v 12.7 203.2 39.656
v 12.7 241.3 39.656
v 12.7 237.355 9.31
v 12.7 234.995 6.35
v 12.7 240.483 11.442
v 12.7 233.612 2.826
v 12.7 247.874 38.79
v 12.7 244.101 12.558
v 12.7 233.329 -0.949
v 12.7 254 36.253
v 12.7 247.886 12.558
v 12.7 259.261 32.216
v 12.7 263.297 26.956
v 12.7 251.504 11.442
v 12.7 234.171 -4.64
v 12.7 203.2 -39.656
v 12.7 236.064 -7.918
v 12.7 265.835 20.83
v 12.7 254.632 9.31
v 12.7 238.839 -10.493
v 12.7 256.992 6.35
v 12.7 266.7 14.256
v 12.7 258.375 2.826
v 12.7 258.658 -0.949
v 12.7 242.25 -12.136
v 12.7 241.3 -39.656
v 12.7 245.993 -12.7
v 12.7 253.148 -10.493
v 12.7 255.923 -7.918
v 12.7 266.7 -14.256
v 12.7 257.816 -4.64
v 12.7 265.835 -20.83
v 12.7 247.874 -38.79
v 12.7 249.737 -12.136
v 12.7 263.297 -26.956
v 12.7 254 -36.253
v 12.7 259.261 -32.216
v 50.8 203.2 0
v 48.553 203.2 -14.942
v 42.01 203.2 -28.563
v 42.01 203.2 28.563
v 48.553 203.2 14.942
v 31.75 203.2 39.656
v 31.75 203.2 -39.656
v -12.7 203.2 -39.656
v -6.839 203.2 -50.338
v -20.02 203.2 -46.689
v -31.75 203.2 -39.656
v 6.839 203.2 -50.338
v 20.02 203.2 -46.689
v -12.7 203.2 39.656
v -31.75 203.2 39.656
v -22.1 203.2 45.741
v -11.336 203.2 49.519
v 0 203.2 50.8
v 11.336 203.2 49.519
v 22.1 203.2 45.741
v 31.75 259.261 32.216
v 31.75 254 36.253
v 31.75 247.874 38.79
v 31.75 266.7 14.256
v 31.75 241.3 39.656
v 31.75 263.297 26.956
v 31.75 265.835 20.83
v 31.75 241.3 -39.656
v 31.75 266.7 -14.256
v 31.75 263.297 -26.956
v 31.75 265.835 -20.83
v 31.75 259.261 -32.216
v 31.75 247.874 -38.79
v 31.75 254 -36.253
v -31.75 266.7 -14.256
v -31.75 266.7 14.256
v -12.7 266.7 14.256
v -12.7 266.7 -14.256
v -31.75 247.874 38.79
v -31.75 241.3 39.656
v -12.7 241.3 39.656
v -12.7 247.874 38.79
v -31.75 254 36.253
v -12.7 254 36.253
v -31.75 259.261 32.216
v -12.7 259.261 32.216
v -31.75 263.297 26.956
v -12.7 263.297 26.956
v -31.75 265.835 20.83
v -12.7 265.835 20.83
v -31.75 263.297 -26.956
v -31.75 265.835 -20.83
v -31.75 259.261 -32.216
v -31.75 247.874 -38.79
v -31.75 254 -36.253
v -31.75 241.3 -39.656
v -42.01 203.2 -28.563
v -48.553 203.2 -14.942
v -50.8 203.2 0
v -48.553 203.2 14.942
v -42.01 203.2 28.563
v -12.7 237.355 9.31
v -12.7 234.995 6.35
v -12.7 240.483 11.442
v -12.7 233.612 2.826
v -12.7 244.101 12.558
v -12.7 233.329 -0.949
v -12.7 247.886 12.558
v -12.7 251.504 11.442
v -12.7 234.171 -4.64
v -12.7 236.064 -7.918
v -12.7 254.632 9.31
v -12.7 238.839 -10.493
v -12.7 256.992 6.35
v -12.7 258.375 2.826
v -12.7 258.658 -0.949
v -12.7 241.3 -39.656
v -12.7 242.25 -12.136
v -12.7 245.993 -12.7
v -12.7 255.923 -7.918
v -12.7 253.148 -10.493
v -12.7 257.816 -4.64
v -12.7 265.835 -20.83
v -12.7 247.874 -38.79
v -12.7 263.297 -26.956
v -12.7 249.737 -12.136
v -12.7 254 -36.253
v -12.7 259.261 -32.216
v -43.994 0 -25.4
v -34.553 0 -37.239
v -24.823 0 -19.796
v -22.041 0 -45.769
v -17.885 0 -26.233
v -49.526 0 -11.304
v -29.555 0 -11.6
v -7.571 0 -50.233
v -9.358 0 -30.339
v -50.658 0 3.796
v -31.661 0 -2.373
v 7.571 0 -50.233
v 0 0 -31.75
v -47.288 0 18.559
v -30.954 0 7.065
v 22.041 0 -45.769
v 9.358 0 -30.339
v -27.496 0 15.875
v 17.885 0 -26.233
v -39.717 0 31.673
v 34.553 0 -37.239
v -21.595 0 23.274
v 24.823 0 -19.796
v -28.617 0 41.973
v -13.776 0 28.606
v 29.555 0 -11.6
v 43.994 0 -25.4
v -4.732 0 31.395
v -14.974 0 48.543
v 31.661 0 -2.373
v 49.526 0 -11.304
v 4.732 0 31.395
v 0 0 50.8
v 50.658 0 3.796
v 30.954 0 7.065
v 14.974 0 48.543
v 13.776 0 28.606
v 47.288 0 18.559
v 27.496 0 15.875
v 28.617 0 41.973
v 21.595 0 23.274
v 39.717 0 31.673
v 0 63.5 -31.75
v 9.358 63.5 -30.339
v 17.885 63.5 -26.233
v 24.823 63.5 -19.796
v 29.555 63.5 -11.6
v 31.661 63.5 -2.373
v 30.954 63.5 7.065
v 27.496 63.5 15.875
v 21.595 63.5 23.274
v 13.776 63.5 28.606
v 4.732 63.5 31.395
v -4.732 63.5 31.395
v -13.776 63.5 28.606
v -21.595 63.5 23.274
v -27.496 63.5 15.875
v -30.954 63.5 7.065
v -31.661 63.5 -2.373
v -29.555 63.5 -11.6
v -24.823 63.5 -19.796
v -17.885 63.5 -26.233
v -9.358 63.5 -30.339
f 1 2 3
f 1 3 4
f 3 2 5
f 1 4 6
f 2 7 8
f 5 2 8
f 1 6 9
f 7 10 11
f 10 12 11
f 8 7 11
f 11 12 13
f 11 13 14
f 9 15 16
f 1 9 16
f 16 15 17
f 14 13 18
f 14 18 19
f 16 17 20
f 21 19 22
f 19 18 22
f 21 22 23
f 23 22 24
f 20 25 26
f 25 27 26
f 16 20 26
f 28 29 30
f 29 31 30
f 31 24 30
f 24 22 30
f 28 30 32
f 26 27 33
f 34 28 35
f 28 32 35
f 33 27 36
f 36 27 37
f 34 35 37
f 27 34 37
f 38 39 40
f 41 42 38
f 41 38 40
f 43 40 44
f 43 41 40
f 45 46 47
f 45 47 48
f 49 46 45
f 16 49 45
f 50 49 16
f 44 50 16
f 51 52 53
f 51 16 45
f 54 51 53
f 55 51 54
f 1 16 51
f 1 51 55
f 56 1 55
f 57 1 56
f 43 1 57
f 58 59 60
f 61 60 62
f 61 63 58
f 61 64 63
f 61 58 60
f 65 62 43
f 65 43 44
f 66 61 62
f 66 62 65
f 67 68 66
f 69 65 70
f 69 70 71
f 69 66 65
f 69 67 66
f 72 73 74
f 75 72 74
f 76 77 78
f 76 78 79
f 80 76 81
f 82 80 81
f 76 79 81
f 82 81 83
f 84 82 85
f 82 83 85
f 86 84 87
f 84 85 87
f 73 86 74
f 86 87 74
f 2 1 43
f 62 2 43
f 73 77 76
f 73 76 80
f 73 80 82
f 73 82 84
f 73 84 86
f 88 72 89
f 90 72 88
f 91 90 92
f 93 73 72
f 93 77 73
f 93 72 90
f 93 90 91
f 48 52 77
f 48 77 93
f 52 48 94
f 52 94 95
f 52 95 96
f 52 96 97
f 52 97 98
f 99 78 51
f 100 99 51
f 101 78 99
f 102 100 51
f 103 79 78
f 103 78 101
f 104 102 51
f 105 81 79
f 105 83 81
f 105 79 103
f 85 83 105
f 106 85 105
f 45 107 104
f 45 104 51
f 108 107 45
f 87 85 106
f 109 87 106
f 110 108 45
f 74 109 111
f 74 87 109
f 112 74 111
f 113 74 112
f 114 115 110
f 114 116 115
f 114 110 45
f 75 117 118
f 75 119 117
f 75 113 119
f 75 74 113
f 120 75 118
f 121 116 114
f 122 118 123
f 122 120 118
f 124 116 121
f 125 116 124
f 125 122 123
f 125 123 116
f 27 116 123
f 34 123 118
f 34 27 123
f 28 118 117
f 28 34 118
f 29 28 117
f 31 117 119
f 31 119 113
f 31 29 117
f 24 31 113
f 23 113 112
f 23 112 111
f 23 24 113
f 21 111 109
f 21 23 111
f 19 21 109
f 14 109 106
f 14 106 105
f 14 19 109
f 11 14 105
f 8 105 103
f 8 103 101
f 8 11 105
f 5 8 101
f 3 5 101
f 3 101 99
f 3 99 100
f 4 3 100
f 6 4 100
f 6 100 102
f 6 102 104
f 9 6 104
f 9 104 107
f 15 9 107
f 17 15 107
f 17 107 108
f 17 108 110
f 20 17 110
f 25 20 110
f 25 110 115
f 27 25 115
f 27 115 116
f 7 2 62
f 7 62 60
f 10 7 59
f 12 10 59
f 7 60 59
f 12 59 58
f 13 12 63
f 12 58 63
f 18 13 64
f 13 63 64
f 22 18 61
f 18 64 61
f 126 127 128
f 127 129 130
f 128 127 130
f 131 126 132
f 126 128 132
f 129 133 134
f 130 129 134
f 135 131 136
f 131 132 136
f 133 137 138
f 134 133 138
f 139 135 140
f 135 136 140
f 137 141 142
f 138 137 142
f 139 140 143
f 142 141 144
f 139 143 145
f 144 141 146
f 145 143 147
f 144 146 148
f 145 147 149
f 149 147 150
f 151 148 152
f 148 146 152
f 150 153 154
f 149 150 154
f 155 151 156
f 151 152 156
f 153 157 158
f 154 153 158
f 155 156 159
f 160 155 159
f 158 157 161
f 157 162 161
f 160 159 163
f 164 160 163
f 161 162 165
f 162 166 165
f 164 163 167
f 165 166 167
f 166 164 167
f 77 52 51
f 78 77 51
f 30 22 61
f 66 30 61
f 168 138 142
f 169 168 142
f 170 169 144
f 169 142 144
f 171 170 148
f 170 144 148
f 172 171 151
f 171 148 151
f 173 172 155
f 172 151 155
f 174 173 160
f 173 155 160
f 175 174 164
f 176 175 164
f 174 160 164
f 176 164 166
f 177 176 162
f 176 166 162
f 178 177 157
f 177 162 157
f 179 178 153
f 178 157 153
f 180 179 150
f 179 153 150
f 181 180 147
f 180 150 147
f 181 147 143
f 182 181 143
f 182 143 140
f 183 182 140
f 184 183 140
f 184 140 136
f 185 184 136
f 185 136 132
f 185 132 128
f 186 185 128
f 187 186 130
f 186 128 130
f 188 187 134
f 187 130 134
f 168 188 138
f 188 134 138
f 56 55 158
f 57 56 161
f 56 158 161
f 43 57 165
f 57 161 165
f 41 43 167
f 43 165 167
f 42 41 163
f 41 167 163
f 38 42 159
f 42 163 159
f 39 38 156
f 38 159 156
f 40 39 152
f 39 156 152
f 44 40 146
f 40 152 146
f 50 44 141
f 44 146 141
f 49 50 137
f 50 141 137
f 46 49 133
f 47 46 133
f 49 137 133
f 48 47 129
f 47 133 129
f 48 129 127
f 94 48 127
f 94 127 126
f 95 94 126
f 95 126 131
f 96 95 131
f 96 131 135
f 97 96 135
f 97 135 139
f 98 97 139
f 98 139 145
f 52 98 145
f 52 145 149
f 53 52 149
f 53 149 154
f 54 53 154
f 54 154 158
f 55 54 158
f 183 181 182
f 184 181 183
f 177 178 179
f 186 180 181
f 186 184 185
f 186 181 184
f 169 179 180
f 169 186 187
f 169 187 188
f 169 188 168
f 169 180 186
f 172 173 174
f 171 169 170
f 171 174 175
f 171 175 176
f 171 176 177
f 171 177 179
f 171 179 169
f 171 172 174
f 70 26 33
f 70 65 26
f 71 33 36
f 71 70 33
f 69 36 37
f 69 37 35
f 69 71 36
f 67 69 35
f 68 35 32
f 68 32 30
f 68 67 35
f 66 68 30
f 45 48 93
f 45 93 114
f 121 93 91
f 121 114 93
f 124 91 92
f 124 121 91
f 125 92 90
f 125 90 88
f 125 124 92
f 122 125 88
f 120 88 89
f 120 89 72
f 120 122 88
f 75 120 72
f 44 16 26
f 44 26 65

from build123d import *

# Parameters (mm, degrees)
SKETCH1_R           = 50.8
BOSS_EXTRUDE1_DEPTH = 203.2
SKETCH2_W           = 63.5
SKETCH2_H           = 79.31147458
BOSS_EXTRUDE2_DEPTH = 63.5
SKETCH3_W           = 25.4
SKETCH3_H           = 79.31147458
CUT_EXTRUDE1_DEPTH  = 63.5
FILLET1_R           = 25.4
SKETCH4_R           = 31.75
CUT_EXTRUDE2_DEPTH  = 63.5
SKETCH5_R           = 12.7
BOSS_EXTRUDE3_DEPTH = 53.34


with BuildPart() as part:
    # Sketch1 → Boss-Extrude1 (new body)
    with BuildSketch(Plane(origin=(0, 0, 0), x_dir=(1, 0, 0), z_dir=(0, 1, 0))):
        with Locations(Location((0, 0, 0), (0, 0, 270))):
            Circle(SKETCH1_R)
    extrude(amount=BOSS_EXTRUDE1_DEPTH)

    # Sketch2 → Boss-Extrude2 (add)
    with BuildSketch(Plane(origin=(0, 203.2, 0), x_dir=(1, 0, 0), z_dir=(0, 1, 0))):
        Rectangle(SKETCH2_W, SKETCH2_H)
    extrude(amount=BOSS_EXTRUDE2_DEPTH)

    # Sketch3 → Cut-Extrude1 (cut)
    with BuildSketch(Plane(origin=(0, 266.7, 0), x_dir=(1, 0, 0), z_dir=(0, 1, 0))):
        Rectangle(SKETCH3_W, SKETCH3_H)
    extrude(amount=-CUT_EXTRUDE1_DEPTH, mode=Mode.SUBTRACT)

    # Fillet1
    fillet1_edges = [part.edges().sort_by_distance(p)[0] for p in [
        (22.225, 266.7, -39.65573729),
        (-22.225, 266.7, 39.65573729),
        (-22.225, 266.7, -39.65573729),
        (22.225, 266.7, 39.65573729),
    ]]
    fillet(fillet1_edges, radius=FILLET1_R)

    # Sketch4 → Cut-Extrude2 (cut)
    with BuildSketch(Plane.XZ):
        with Locations(Location((0, 0, 0), (0, 0, 270))):
            Circle(SKETCH4_R)
    extrude(amount=-CUT_EXTRUDE2_DEPTH, mode=Mode.SUBTRACT)

    # Sketch5 → Boss-Extrude3 (add)
    with BuildSketch(Plane(origin=(31.75, 0, 0), x_dir=(0, 0, -1), z_dir=(1, 0, 0))):
        with Locations((0, 245.993497046)):
            Circle(SKETCH5_R)
    extrude(amount=-BOSS_EXTRUDE3_DEPTH)


solid = part.part
